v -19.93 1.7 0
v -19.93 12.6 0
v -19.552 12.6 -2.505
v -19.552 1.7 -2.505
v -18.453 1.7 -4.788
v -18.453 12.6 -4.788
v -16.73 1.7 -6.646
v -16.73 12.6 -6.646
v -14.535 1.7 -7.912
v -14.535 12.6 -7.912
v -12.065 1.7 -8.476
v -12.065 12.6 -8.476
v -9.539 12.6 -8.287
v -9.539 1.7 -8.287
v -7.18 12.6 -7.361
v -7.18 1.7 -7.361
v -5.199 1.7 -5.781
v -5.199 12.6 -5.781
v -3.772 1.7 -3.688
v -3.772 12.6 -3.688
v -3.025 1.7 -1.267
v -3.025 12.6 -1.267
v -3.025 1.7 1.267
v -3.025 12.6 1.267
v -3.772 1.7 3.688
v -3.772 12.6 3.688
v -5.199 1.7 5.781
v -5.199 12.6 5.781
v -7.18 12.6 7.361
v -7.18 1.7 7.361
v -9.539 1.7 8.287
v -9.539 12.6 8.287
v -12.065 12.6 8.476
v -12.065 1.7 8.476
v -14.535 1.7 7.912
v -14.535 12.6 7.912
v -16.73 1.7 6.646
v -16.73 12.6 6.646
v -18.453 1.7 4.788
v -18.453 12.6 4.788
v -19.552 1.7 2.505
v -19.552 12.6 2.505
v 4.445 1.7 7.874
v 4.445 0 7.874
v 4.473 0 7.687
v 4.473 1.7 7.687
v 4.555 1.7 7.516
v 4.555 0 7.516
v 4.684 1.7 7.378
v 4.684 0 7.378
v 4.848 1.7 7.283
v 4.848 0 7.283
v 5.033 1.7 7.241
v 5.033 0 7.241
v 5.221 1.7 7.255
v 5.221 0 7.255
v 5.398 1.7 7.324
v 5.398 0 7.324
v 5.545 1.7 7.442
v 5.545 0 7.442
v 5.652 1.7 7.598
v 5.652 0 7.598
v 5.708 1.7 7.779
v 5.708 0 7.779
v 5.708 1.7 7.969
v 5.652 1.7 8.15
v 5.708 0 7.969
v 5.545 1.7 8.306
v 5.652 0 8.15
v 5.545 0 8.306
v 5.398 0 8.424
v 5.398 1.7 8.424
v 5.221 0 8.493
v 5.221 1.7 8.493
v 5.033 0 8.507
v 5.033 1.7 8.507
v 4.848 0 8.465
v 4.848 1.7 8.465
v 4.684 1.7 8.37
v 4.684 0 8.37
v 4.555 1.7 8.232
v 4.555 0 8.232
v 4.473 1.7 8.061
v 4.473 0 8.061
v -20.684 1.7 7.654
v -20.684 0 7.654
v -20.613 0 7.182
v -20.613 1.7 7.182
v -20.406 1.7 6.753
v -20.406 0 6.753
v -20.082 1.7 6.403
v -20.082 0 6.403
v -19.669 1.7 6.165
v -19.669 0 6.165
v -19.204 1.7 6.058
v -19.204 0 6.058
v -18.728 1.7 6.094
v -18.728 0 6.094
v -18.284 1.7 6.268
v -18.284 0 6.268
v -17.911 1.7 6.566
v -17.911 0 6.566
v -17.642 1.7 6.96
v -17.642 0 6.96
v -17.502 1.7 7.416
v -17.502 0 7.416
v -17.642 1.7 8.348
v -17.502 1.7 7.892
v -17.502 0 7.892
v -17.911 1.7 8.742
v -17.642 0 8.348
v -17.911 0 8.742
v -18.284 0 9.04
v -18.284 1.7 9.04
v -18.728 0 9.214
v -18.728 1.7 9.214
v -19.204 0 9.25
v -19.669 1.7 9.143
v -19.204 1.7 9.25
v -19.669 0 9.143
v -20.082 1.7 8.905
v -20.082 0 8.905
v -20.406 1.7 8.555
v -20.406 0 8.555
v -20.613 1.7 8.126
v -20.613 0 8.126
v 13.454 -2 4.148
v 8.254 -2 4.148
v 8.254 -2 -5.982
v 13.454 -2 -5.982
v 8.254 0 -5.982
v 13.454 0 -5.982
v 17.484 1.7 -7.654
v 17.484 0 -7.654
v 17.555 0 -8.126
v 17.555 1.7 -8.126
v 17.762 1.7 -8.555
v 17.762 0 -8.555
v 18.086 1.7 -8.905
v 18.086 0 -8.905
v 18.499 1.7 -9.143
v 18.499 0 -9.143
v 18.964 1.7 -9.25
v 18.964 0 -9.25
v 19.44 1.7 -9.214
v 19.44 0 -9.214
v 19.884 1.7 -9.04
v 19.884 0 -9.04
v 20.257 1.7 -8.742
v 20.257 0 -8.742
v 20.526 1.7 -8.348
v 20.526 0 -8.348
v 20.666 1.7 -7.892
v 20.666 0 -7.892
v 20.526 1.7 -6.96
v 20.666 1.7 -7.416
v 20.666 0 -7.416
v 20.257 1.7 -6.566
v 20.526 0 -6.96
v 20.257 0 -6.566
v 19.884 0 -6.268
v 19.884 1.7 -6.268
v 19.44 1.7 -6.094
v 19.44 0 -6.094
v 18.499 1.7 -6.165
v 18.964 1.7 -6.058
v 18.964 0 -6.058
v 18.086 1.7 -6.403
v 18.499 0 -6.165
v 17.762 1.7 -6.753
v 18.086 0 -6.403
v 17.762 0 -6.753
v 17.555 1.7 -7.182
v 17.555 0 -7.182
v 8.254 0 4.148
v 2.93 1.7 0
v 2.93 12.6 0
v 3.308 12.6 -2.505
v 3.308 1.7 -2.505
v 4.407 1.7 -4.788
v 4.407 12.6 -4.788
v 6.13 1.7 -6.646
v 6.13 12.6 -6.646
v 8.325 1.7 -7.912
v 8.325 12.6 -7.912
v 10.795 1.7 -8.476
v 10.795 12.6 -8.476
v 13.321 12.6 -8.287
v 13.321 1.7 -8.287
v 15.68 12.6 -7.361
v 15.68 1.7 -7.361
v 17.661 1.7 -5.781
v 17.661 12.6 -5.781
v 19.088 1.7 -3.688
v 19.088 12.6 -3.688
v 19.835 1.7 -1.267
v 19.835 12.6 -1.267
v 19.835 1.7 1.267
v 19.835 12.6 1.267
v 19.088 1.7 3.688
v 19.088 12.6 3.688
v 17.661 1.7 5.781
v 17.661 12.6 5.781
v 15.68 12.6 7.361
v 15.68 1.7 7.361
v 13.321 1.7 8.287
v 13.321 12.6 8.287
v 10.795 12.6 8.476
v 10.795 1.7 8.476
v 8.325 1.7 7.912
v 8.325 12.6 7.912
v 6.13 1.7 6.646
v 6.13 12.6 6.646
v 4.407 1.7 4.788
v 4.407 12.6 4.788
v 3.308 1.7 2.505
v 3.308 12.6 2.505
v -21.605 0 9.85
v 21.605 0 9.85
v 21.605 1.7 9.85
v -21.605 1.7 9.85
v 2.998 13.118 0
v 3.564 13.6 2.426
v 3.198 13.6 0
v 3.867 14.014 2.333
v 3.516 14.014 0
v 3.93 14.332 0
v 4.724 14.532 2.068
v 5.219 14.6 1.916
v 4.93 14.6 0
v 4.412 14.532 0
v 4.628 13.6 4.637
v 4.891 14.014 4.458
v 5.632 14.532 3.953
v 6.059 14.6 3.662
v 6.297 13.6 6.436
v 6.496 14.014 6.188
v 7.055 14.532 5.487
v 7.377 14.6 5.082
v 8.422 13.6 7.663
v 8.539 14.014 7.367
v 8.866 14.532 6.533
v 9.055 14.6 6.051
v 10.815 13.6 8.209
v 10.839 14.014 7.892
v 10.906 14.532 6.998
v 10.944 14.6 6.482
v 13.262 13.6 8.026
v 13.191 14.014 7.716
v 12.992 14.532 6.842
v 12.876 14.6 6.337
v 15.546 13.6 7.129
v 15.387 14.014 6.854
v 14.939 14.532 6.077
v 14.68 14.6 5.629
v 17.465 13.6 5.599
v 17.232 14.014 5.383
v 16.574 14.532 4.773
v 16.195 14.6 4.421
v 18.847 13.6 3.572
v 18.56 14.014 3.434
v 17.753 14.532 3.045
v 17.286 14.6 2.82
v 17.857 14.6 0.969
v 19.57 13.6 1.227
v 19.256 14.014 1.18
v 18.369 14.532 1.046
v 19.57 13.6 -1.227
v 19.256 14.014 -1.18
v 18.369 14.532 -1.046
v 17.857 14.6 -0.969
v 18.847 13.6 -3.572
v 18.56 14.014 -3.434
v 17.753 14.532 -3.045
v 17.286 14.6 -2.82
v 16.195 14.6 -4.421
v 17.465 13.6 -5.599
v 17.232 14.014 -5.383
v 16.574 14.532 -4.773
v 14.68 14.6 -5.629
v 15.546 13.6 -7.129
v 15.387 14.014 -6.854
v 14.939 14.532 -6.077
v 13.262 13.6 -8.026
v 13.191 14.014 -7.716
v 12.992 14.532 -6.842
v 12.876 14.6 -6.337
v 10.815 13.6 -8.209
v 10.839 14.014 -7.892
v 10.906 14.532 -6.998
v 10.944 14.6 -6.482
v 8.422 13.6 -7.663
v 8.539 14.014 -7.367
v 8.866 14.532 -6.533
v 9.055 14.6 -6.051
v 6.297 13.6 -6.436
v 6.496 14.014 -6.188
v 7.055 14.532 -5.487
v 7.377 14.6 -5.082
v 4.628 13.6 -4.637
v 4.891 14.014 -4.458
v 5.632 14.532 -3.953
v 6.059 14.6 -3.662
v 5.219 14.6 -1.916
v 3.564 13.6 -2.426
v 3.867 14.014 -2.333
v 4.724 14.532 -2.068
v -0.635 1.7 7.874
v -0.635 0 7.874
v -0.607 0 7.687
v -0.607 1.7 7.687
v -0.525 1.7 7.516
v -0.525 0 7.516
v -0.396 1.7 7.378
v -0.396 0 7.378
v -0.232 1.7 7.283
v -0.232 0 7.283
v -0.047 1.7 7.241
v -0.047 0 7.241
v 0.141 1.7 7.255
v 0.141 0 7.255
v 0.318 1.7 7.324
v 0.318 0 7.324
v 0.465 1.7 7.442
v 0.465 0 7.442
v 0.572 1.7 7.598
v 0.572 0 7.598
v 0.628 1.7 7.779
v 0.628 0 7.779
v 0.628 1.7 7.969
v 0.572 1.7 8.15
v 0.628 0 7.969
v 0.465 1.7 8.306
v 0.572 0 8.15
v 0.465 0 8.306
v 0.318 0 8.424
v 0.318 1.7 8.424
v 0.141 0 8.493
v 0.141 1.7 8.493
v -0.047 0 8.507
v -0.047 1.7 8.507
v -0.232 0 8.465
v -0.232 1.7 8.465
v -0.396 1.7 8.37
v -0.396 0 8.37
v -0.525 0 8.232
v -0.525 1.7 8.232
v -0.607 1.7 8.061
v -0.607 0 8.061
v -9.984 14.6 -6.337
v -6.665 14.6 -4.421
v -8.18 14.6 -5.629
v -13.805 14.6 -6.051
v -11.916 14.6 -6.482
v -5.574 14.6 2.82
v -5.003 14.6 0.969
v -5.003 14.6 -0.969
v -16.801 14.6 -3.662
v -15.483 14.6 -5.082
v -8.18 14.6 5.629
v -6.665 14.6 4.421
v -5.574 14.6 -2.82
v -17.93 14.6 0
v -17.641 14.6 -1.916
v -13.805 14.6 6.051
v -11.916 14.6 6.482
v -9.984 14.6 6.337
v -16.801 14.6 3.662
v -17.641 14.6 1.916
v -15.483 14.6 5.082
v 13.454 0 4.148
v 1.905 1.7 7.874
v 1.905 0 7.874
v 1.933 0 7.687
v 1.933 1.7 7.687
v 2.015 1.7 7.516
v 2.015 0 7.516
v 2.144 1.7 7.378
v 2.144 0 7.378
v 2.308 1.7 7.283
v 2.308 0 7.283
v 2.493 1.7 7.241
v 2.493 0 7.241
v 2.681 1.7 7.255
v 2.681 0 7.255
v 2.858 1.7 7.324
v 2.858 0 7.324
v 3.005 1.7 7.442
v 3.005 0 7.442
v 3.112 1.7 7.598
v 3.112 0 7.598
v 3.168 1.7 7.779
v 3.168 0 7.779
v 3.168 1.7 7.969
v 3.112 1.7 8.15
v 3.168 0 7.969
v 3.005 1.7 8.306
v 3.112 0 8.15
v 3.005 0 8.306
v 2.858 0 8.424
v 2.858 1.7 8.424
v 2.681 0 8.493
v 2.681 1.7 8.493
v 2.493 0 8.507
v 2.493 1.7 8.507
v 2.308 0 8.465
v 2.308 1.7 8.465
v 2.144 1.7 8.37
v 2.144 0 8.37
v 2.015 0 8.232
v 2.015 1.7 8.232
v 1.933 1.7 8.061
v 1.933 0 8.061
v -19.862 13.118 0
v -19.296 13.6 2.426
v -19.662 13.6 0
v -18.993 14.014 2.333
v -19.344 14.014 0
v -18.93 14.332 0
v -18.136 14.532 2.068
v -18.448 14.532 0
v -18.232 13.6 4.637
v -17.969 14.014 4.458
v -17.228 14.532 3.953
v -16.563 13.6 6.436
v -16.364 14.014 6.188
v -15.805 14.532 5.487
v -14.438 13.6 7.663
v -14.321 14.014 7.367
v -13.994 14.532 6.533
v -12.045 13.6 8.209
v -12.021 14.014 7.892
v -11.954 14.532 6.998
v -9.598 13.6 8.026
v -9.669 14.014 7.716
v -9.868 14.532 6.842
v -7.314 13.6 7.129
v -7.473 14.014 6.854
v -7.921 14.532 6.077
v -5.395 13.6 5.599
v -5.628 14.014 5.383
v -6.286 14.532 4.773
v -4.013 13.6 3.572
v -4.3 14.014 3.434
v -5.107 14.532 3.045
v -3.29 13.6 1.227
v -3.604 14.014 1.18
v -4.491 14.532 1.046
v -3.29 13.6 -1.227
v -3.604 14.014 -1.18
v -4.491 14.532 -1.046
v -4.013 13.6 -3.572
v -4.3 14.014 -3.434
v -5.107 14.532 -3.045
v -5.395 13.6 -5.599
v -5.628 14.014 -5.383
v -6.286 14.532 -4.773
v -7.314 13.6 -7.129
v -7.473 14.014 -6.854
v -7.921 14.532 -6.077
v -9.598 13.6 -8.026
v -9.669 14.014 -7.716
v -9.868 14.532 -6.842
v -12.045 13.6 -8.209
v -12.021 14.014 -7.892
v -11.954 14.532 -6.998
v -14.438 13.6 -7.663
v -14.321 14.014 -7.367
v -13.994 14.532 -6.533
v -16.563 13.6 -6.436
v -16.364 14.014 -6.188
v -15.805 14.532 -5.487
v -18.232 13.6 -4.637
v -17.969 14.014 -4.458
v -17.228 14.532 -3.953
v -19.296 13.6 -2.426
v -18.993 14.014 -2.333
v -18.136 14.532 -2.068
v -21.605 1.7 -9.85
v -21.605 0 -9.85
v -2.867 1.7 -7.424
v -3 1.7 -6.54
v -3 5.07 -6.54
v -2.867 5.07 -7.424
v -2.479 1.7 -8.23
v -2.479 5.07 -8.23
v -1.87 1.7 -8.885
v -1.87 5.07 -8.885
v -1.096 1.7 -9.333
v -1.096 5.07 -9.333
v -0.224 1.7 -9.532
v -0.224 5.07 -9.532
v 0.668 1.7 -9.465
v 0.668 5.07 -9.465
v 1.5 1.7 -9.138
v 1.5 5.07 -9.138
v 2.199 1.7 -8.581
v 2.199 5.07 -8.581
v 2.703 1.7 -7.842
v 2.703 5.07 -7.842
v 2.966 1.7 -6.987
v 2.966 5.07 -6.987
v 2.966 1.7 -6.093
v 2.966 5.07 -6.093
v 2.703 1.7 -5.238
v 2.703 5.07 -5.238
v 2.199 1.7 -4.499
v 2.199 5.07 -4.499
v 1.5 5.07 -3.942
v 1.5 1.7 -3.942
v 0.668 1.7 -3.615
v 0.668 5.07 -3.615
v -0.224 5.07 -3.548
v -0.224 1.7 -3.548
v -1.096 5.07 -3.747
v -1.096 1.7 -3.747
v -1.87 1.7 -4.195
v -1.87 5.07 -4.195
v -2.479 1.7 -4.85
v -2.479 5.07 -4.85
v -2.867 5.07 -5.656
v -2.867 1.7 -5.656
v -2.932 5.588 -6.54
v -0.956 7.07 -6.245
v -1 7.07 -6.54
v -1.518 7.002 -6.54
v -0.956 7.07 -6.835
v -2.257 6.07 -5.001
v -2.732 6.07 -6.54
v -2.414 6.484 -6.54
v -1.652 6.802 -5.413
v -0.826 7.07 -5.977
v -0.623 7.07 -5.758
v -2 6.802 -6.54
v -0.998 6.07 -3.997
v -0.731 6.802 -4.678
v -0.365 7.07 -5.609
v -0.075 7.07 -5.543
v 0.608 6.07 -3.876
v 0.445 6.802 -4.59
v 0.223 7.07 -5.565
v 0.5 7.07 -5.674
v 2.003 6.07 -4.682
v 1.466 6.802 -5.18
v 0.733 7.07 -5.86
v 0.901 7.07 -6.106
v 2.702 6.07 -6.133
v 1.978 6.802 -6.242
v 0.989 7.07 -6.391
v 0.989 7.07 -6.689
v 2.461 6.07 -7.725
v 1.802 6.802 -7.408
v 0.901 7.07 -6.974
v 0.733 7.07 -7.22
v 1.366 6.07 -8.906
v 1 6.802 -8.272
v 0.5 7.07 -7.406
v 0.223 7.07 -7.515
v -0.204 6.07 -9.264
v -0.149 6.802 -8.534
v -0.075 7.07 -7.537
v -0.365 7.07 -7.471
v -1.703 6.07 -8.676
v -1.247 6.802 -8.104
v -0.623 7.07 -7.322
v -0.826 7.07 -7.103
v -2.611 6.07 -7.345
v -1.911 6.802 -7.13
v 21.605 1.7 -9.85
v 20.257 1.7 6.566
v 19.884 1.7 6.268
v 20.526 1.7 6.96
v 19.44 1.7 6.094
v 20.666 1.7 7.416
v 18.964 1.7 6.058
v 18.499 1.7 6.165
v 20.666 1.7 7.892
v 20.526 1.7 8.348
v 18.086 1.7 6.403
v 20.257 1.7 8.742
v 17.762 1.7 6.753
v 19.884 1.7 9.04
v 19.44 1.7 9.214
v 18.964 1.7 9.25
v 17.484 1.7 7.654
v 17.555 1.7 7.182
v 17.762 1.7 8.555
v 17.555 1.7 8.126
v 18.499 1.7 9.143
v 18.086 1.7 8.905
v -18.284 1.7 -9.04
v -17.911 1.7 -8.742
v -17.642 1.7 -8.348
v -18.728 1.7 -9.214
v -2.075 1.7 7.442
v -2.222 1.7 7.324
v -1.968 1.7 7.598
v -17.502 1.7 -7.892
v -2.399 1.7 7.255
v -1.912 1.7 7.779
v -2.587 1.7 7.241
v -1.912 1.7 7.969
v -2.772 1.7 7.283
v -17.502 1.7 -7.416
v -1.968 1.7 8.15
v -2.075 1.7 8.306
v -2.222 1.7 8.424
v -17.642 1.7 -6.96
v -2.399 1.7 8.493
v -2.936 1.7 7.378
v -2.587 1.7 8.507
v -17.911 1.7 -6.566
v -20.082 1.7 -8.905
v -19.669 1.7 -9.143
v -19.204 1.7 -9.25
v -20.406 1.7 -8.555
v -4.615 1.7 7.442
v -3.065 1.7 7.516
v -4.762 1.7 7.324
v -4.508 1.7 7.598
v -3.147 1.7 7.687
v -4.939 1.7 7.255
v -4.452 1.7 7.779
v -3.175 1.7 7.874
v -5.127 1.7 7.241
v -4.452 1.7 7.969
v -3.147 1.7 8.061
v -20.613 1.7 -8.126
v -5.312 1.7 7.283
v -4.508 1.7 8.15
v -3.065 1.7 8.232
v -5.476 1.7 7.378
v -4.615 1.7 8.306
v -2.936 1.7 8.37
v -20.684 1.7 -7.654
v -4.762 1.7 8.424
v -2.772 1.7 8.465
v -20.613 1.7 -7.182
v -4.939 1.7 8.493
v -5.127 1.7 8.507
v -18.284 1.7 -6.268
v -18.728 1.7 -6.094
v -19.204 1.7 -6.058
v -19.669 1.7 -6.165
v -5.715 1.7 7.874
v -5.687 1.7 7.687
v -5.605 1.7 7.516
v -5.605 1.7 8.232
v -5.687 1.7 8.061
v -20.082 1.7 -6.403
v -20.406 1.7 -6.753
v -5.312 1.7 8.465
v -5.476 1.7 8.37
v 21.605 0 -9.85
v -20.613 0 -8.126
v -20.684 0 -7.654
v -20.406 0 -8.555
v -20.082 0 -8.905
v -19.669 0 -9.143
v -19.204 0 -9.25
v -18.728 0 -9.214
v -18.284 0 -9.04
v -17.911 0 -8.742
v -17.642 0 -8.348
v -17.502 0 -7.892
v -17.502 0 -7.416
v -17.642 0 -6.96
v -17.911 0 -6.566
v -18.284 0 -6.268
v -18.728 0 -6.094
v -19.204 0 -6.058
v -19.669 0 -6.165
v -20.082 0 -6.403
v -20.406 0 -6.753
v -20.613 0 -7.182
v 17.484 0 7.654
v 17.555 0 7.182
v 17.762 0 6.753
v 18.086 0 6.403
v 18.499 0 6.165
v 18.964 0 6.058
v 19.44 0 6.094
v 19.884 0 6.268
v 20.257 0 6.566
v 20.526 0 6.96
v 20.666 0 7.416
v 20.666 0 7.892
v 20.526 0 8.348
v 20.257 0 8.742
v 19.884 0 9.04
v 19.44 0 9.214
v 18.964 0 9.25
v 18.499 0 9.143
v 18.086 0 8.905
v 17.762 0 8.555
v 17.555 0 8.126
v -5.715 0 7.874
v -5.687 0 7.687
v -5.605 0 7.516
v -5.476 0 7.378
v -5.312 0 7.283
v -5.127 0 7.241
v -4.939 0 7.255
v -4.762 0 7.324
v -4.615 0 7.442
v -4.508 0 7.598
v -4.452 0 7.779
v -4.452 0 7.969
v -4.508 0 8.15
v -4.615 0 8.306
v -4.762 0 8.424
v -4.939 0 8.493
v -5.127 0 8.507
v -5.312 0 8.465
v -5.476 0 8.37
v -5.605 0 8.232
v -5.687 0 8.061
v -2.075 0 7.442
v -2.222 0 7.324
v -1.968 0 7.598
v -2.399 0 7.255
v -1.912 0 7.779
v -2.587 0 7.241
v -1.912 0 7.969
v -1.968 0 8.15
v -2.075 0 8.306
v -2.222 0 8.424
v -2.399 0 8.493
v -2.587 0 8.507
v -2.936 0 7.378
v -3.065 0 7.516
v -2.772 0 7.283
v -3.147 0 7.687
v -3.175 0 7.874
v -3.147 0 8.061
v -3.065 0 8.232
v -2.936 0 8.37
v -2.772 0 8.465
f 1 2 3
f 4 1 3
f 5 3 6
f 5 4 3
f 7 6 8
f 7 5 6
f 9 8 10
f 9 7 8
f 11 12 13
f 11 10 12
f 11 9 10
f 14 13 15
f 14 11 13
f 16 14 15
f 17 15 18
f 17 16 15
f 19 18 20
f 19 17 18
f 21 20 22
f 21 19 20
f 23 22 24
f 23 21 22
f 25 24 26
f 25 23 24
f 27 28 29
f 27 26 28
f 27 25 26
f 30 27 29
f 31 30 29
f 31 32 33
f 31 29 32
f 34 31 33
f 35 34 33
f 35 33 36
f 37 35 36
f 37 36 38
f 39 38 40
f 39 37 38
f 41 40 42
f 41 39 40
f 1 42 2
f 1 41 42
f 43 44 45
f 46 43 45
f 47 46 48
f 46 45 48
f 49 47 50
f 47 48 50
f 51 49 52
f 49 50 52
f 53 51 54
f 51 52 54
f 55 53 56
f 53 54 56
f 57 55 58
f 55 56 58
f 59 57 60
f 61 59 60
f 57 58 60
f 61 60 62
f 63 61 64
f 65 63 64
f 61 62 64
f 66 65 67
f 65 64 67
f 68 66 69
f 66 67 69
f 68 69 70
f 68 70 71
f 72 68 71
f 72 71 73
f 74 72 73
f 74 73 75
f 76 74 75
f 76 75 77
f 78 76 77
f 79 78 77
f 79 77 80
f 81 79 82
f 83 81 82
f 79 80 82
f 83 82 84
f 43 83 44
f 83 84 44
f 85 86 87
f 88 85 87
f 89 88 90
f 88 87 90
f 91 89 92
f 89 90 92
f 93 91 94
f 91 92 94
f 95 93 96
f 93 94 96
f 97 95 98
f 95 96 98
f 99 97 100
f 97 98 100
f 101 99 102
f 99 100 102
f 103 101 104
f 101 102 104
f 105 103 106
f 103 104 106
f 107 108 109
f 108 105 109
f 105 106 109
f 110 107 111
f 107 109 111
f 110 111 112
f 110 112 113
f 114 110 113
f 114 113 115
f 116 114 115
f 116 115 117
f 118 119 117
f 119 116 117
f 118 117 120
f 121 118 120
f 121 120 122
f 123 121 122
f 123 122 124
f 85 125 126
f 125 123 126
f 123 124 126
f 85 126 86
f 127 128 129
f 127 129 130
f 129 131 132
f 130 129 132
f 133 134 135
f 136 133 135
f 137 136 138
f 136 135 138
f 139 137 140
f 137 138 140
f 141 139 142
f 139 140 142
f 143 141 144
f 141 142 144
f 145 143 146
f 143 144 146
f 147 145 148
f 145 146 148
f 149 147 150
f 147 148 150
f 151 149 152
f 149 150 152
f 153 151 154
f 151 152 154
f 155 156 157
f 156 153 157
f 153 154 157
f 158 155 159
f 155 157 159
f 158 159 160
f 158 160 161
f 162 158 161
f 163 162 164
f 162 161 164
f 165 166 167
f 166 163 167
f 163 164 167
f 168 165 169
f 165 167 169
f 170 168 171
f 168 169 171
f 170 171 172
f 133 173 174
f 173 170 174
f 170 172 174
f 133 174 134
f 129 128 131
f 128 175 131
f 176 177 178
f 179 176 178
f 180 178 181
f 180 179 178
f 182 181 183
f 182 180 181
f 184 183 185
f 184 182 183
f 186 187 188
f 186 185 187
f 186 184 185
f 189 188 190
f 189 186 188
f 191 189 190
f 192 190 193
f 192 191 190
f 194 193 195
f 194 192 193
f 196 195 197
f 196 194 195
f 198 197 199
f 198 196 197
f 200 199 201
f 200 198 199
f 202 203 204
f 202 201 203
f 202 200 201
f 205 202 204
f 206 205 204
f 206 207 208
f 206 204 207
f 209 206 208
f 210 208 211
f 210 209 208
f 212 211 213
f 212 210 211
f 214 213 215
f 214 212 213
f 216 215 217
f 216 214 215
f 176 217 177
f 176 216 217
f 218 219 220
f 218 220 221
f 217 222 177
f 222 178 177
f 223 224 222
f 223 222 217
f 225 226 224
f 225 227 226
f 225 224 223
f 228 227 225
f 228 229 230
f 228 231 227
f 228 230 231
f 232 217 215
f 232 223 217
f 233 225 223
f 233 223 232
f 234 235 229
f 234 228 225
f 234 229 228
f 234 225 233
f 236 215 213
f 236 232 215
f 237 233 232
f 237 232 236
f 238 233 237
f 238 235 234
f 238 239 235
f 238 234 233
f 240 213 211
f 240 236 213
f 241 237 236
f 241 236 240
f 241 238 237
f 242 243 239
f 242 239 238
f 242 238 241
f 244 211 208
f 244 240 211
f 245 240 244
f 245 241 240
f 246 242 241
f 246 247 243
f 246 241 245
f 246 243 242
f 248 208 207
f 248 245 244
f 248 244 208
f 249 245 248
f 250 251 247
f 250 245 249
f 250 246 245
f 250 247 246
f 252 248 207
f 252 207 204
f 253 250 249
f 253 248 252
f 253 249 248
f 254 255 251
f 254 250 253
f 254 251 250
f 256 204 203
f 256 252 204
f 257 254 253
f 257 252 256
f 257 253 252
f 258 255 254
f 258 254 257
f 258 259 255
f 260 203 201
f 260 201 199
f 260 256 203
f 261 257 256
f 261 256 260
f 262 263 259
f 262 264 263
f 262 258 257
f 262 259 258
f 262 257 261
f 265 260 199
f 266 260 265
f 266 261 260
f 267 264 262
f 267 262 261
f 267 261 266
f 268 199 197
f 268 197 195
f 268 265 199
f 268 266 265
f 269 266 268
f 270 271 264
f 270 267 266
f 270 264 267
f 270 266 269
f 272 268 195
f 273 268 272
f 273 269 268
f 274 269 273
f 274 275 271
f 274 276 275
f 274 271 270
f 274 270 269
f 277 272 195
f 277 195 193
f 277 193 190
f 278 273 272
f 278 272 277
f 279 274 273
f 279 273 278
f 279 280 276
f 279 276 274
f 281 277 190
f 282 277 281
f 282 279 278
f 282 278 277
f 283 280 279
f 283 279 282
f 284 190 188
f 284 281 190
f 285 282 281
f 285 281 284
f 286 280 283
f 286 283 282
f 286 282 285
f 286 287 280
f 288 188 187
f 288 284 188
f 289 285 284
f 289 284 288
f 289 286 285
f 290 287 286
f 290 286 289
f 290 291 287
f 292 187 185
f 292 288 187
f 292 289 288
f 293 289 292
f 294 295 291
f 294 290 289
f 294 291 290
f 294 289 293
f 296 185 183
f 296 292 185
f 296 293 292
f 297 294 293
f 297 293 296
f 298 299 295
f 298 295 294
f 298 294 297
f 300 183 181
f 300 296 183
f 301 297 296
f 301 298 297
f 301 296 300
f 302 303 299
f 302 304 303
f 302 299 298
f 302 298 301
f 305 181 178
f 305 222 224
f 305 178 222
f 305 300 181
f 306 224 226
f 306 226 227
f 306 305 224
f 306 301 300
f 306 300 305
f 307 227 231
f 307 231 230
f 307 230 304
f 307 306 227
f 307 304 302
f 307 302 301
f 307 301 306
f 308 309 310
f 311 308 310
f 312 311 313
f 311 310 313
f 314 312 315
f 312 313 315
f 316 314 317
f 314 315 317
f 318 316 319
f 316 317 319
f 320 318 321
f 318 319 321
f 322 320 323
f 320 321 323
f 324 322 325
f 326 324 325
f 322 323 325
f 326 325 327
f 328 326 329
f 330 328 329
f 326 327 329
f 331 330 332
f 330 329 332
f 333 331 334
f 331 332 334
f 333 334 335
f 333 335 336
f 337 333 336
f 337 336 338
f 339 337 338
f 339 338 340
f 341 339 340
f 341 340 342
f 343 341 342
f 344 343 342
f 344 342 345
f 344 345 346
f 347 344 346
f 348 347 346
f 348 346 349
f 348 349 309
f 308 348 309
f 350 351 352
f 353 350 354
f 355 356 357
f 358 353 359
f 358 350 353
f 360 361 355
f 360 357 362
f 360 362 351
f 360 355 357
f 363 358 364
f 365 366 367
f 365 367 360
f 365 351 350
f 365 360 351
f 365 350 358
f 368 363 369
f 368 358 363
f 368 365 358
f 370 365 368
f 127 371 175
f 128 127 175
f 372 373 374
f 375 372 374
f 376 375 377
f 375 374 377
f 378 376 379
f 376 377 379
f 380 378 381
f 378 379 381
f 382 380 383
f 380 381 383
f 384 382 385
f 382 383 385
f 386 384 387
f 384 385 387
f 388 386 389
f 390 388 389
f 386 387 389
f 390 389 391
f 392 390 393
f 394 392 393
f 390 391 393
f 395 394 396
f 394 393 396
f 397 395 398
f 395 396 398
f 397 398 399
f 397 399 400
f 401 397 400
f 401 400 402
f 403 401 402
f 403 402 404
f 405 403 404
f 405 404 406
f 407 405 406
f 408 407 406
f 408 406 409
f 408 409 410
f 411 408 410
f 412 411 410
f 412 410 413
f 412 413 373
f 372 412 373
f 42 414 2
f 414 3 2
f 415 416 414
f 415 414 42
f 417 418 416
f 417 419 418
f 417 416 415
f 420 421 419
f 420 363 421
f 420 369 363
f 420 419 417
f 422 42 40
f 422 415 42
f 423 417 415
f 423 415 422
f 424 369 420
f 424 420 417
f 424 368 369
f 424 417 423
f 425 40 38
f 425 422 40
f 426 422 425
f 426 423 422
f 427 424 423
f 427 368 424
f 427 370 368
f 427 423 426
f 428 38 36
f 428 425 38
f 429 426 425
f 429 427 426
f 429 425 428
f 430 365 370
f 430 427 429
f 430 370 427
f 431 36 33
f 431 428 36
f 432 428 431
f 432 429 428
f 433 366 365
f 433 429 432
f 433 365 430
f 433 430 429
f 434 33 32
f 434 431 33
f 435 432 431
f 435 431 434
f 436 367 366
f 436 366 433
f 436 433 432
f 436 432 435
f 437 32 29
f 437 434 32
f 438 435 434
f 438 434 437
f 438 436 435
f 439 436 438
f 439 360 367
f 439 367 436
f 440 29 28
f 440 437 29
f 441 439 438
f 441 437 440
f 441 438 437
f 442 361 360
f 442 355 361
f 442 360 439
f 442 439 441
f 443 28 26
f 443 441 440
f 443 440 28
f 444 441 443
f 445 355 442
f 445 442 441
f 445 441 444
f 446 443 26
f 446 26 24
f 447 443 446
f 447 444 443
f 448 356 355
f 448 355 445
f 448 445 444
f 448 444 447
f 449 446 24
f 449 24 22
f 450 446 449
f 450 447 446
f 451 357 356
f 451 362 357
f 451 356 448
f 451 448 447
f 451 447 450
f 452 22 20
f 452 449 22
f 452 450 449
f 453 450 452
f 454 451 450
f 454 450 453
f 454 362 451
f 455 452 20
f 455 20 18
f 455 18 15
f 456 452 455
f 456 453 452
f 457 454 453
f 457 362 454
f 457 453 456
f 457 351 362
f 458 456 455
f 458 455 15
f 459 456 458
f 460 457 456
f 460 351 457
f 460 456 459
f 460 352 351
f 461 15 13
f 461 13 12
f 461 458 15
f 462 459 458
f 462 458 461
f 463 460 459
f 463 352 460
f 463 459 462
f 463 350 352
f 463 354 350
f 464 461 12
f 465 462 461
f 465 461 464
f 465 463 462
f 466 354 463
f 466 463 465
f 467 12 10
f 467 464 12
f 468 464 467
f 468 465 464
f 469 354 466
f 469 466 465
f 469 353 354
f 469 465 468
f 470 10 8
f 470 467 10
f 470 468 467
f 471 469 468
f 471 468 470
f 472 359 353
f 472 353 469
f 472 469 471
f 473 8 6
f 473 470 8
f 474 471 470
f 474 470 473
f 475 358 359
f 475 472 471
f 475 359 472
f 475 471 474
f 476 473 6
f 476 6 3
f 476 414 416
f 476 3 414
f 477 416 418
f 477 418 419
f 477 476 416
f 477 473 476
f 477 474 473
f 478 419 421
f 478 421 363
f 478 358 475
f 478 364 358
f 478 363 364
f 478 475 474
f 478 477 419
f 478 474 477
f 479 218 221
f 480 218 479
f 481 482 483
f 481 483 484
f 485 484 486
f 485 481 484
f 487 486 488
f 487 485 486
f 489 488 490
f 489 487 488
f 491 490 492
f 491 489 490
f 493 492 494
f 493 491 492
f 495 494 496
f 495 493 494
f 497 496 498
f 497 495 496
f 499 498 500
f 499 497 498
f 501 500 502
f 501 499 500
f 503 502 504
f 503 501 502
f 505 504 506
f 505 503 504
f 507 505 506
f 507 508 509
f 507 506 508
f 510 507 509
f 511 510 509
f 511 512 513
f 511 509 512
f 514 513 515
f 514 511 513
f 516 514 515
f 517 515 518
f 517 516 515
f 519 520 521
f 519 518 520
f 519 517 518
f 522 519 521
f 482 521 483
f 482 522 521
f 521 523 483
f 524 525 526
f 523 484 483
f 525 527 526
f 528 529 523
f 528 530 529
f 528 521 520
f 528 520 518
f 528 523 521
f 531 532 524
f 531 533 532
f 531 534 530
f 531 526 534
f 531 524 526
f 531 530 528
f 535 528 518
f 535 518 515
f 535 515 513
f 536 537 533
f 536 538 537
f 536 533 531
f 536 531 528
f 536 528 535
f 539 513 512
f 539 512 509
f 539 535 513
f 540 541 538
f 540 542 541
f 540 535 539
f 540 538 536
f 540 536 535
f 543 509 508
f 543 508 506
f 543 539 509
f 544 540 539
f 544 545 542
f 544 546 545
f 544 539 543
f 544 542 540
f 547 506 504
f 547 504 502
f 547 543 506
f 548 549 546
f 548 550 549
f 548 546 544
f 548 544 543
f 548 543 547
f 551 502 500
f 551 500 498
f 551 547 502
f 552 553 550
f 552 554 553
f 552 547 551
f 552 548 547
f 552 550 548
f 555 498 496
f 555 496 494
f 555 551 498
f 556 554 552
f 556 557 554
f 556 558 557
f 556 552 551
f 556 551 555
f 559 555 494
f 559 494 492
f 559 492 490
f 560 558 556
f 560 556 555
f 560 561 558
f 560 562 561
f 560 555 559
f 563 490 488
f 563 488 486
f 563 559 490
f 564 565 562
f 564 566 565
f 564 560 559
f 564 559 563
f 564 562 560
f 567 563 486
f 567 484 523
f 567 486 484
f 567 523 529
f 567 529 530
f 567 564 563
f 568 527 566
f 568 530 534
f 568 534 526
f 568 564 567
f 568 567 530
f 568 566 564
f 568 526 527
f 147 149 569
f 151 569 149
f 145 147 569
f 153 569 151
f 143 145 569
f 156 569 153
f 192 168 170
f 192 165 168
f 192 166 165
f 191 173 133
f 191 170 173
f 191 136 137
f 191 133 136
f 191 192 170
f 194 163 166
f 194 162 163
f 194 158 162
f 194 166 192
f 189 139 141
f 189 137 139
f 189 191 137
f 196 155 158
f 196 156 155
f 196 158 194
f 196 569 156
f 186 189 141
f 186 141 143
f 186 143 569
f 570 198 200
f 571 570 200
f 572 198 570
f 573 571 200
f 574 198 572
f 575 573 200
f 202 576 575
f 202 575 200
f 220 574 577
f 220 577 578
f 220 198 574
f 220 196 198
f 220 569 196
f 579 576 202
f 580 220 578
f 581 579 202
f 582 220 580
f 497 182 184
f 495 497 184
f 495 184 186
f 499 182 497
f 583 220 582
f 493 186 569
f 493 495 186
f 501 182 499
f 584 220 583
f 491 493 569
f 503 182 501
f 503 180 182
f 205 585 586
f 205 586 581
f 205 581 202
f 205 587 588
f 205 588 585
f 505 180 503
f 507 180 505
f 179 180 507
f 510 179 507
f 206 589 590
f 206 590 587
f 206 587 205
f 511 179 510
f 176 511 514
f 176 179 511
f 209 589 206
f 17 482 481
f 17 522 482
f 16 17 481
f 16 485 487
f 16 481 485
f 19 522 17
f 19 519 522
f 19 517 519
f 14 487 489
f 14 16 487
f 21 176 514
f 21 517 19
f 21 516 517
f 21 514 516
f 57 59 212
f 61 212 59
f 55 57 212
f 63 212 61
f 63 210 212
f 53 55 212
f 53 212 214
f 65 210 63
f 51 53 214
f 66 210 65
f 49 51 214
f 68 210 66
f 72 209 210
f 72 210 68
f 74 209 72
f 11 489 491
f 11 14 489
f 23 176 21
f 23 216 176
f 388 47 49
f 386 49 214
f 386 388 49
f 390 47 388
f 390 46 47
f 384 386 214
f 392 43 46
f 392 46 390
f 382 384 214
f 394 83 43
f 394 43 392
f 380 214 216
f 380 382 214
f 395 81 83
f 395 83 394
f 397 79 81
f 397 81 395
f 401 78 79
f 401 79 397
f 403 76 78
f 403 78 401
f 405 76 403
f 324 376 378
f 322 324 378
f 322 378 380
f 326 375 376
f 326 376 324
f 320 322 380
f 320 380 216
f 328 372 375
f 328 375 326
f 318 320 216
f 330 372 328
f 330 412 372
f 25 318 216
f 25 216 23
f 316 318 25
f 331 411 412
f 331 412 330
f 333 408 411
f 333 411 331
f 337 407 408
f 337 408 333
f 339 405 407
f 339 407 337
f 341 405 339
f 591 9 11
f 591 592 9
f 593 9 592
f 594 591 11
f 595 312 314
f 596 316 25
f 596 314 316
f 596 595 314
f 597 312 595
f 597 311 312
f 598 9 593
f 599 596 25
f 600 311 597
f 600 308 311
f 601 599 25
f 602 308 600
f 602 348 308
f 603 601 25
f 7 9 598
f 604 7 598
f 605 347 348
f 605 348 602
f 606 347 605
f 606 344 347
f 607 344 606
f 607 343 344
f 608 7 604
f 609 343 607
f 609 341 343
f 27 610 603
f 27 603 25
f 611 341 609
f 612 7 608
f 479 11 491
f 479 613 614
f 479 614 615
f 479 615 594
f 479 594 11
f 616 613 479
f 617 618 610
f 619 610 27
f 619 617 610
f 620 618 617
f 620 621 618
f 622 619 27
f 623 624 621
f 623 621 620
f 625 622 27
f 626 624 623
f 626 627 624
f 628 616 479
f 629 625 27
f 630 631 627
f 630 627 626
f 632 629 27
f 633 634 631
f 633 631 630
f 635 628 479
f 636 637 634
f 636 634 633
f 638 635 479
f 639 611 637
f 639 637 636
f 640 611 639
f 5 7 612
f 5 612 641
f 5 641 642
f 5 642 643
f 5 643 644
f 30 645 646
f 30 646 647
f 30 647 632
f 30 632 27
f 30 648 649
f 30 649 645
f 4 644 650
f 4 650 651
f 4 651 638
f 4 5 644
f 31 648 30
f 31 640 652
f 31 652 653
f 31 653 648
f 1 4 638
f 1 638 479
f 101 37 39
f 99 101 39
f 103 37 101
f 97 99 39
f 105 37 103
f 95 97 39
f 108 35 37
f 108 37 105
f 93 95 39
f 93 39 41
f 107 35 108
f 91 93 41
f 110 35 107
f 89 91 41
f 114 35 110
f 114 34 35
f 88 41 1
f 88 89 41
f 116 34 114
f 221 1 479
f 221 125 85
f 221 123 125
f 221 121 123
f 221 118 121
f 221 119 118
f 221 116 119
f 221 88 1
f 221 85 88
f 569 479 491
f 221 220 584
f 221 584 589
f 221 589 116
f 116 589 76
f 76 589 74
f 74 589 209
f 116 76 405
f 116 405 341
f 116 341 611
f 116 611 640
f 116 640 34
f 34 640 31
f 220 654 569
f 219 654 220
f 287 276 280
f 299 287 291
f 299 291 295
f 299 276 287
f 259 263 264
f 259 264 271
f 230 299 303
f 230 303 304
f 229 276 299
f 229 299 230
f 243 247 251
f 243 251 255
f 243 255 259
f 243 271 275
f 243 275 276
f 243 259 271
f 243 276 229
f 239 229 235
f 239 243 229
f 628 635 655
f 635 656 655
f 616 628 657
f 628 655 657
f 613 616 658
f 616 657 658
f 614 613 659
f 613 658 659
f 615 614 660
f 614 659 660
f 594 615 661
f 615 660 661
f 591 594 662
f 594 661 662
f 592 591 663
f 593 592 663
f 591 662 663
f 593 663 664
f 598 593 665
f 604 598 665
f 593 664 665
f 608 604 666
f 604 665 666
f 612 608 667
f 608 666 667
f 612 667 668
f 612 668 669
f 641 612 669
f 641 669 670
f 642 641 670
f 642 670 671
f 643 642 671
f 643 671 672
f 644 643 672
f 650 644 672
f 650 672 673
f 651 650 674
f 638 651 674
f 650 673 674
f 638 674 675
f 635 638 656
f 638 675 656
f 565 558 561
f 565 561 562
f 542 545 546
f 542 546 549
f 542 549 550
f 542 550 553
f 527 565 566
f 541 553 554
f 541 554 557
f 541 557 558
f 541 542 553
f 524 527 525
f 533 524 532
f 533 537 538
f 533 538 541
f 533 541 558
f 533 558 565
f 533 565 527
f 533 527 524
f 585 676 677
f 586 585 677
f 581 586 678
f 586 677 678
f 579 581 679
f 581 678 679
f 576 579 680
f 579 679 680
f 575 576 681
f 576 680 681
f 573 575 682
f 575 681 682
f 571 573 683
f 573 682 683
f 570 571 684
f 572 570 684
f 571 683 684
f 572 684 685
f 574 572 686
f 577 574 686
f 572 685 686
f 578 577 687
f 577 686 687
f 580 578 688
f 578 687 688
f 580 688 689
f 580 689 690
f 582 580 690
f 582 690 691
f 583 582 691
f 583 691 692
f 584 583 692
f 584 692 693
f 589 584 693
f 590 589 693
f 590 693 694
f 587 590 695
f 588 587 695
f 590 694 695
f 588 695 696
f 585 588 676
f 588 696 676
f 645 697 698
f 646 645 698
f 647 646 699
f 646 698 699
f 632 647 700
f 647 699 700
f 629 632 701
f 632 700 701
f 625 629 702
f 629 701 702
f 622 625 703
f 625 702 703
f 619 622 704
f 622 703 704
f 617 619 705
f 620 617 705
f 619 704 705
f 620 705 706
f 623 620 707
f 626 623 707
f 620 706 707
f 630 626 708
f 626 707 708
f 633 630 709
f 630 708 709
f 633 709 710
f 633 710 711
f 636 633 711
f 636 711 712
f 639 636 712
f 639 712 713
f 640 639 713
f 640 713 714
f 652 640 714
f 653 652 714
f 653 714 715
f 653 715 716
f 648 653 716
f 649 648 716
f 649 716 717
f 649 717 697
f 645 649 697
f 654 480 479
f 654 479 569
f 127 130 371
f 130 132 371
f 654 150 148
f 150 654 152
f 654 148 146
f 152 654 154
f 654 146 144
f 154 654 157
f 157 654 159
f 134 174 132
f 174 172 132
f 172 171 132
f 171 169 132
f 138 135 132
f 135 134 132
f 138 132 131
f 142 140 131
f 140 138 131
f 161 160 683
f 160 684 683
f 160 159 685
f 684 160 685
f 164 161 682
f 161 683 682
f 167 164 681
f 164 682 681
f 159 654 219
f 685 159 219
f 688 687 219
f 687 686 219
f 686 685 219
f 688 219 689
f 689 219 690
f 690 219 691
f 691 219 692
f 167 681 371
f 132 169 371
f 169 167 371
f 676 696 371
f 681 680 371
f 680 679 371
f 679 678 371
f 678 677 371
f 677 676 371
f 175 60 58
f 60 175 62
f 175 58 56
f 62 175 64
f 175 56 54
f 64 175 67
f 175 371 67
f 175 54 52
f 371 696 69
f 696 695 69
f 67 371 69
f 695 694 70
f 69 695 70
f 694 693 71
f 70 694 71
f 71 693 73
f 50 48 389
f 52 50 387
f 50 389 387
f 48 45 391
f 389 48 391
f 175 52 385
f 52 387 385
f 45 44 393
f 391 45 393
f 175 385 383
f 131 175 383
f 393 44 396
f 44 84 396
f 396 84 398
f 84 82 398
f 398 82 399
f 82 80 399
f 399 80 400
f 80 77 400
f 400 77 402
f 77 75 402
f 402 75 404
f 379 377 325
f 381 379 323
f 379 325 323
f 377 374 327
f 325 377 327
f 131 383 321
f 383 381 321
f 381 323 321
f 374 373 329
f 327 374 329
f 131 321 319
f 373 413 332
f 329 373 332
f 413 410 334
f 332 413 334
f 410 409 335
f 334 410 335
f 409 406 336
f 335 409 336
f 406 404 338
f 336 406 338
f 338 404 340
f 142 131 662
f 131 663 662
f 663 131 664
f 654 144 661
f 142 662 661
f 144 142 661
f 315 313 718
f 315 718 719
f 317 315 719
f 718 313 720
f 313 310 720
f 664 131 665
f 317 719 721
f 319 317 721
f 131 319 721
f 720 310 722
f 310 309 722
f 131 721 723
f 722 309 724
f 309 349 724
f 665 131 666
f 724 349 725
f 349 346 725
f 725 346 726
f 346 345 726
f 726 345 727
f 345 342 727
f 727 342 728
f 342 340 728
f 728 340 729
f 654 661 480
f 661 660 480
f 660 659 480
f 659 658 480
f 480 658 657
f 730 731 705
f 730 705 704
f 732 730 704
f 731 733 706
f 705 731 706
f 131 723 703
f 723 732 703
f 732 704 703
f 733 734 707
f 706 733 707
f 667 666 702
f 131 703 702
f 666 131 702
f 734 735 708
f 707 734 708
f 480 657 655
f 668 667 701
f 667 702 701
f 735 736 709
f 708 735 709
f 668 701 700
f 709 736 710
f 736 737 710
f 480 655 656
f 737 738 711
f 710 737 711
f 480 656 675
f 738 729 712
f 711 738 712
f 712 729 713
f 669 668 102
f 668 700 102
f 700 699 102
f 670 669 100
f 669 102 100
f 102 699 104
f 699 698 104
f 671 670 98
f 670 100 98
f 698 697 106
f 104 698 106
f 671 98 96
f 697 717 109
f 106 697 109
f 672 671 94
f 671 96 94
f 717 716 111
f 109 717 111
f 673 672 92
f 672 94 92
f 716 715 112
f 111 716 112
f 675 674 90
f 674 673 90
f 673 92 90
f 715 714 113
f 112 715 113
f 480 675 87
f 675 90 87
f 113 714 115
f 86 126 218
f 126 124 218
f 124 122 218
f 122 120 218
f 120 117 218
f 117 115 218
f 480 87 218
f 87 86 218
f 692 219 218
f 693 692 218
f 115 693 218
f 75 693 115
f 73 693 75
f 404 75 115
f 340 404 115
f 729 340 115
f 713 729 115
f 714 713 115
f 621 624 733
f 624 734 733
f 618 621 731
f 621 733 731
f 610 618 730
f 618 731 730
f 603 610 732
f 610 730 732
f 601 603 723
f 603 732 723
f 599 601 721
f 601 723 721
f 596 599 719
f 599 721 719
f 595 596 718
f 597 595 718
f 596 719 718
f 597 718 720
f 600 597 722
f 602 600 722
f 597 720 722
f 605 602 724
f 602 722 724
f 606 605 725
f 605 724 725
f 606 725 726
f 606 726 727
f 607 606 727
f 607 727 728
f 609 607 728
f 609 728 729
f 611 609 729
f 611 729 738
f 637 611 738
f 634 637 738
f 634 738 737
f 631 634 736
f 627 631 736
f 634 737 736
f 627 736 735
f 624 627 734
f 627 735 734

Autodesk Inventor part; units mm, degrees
ref_plane "YZ Plane" through (0, 0, 0) normal (1, 0, 0) x (0, 1, 0)
ref_plane "XZ Plane" through (0, 0, 0) normal (0, 1, 0) x (-1, 0, 0)
ref_plane "XY Plane" through (0, 0, 0) normal (0, 0, 1) x (1, 0, 0)
sketch "Sketch1" plane through (0, 0, 0) normal (0, 1, 0) x (-1, 0, 0)
  line L0 (21.605, -9.85) -> (-21.605, -9.85)
  line L1 (-21.605, -9.85) -> (-21.605, 9.85)
  line L2 (-21.605, 9.85) -> (21.605, 9.85)
  line L3 (21.605, 9.85) -> (21.605, -9.85)
  line L4 (21.605, -9.85) -> (-21.605, 9.85) construction
  line L5 (-21.605, -9.85) -> (21.605, 9.85) construction
  circle A0 centre (-19.084, -7.654) radius 1.6
  circle A1 centre (19.084, 7.654) radius 1.6
  circle A2 centre (-11.43, 0) radius 8.5
  circle A3 centre (11.43, 0) radius 8.5
  circle A4 centre (0, -6.54) radius 3
  circle A5 centre (0, 7.874) radius 0.635
  circle A6 centre (-2.54, 7.874) radius 0.635
  circle A7 centre (-5.08, 7.874) radius 0.635
  circle A8 centre (2.54, 7.874) radius 0.635
  circle A9 centre (5.08, 7.874) radius 0.635
  line L6 (0, -13) -> (0, -21) construction
  line L7 (0, -13) -> (8, -13) construction
  circle A10 centre (-19.084, 7.654) radius 1.6
  circle A11 centre (19.084, -7.654) radius 1.6
  line L8 (-25, 0) -> (-35, 0) construction
  line L9 (-25, 0) -> (-15, 0) construction
  circle A12 centre (0, 6.54) radius 3
  point P0 (0, 0)
  dimension "d0" = 43.21
  dimension "d1" = 19.7
  dimension "d2" = 3.2
  dimension "d5" = 3.2
  dimension "d8" = 17
  dimension "d9" = 17
  dimension "d14" = 6
  dimension "d26" = 1.27
  dimension "d27" = 1.27
  dimension "d28" = 1.27
  dimension "d29" = 1.27
  dimension "d30" = 1.27
  dimension "d31" = 2.54
  dimension "d32" = 2.54
  dimension "d33" = 2.54
  dimension "d34" = 2.54
  dimension "d41" = 22.86
  dimension "d43" = 10.175
  dimension "d44" = 10.175
  dimension "d45" = 6.54
  dimension "d47" = 7.874
  dimension "d48" = 7.654
  dimension "d49" = 7.654
  dimension "d50" = 7.654
  dimension "d51" = 7.654
  dimension "d52" = 90
  dimension "d53" = 180
  dimension "d56" = 2.196
extrude "Extrusion1" add sketch "Sketch1" along normal blind 1.7 contours L0 L1 L2 L3 | A5 | A6 A12 | A6 A12 A8 | A12 A6 | A12 A8 | A8 A12 | A7 | A9 | A10 | A11
extrude "Extrusion2" add sketch "Sketch1" along normal blind 14.6 contours A2 | A3
extrude "Extrusion3" add sketch "Sketch1" along normal blind 7.07 contours A4
sketch "Sketch2" plane through (0, 0, 0) normal (0, -1, 0) x (1, 0, 0)
  line L0 (13.454, 4.1484) -> (8.254, 4.1484)
  line L1 (8.254, 4.1484) -> (8.254, -5.9816)
  line L2 (8.254, -5.9816) -> (13.454, -5.9816)
  line L3 (13.454, -5.9816) -> (13.454, 4.1484)
  line L4 (13.454, 4.1484) -> (8.254, -5.9816) construction
  line L5 (8.254, 4.1484) -> (13.454, -5.9816) construction
  point P0 (0, 0)
  point P1 (10.854, -0.9166)
  dimension "d22" = 5.2
  dimension "d23" = 10.13
extrude "Extrusion4" add sketch "Sketch2" along normal blind 2
extrude "Extrusion5" cut sketch "Sketch1" along normal through all contours A5 | A6 A12 | A12 A6 | A12 A8 | A8 A12 | A7 | A9
fillet "Fillet1" radius 2 2 edges at (19.93, 14.6, 0) (-2.93, 14.6, 0)
fillet "Fillet2" radius 2 1 edges at (3, 7.07, -6.54)
extrude "Extrusion6" cut sketch "Sketch1" along normal through all contours A10 | A11
sketch "Sketch3" plane through (0, 0, 0) normal (0, -1, 0) x (1, 0, 0)
  circle A0 centre (0, 6.54) radius 3 projected
  point P0 (0, 0)
properties part number "srf08"
